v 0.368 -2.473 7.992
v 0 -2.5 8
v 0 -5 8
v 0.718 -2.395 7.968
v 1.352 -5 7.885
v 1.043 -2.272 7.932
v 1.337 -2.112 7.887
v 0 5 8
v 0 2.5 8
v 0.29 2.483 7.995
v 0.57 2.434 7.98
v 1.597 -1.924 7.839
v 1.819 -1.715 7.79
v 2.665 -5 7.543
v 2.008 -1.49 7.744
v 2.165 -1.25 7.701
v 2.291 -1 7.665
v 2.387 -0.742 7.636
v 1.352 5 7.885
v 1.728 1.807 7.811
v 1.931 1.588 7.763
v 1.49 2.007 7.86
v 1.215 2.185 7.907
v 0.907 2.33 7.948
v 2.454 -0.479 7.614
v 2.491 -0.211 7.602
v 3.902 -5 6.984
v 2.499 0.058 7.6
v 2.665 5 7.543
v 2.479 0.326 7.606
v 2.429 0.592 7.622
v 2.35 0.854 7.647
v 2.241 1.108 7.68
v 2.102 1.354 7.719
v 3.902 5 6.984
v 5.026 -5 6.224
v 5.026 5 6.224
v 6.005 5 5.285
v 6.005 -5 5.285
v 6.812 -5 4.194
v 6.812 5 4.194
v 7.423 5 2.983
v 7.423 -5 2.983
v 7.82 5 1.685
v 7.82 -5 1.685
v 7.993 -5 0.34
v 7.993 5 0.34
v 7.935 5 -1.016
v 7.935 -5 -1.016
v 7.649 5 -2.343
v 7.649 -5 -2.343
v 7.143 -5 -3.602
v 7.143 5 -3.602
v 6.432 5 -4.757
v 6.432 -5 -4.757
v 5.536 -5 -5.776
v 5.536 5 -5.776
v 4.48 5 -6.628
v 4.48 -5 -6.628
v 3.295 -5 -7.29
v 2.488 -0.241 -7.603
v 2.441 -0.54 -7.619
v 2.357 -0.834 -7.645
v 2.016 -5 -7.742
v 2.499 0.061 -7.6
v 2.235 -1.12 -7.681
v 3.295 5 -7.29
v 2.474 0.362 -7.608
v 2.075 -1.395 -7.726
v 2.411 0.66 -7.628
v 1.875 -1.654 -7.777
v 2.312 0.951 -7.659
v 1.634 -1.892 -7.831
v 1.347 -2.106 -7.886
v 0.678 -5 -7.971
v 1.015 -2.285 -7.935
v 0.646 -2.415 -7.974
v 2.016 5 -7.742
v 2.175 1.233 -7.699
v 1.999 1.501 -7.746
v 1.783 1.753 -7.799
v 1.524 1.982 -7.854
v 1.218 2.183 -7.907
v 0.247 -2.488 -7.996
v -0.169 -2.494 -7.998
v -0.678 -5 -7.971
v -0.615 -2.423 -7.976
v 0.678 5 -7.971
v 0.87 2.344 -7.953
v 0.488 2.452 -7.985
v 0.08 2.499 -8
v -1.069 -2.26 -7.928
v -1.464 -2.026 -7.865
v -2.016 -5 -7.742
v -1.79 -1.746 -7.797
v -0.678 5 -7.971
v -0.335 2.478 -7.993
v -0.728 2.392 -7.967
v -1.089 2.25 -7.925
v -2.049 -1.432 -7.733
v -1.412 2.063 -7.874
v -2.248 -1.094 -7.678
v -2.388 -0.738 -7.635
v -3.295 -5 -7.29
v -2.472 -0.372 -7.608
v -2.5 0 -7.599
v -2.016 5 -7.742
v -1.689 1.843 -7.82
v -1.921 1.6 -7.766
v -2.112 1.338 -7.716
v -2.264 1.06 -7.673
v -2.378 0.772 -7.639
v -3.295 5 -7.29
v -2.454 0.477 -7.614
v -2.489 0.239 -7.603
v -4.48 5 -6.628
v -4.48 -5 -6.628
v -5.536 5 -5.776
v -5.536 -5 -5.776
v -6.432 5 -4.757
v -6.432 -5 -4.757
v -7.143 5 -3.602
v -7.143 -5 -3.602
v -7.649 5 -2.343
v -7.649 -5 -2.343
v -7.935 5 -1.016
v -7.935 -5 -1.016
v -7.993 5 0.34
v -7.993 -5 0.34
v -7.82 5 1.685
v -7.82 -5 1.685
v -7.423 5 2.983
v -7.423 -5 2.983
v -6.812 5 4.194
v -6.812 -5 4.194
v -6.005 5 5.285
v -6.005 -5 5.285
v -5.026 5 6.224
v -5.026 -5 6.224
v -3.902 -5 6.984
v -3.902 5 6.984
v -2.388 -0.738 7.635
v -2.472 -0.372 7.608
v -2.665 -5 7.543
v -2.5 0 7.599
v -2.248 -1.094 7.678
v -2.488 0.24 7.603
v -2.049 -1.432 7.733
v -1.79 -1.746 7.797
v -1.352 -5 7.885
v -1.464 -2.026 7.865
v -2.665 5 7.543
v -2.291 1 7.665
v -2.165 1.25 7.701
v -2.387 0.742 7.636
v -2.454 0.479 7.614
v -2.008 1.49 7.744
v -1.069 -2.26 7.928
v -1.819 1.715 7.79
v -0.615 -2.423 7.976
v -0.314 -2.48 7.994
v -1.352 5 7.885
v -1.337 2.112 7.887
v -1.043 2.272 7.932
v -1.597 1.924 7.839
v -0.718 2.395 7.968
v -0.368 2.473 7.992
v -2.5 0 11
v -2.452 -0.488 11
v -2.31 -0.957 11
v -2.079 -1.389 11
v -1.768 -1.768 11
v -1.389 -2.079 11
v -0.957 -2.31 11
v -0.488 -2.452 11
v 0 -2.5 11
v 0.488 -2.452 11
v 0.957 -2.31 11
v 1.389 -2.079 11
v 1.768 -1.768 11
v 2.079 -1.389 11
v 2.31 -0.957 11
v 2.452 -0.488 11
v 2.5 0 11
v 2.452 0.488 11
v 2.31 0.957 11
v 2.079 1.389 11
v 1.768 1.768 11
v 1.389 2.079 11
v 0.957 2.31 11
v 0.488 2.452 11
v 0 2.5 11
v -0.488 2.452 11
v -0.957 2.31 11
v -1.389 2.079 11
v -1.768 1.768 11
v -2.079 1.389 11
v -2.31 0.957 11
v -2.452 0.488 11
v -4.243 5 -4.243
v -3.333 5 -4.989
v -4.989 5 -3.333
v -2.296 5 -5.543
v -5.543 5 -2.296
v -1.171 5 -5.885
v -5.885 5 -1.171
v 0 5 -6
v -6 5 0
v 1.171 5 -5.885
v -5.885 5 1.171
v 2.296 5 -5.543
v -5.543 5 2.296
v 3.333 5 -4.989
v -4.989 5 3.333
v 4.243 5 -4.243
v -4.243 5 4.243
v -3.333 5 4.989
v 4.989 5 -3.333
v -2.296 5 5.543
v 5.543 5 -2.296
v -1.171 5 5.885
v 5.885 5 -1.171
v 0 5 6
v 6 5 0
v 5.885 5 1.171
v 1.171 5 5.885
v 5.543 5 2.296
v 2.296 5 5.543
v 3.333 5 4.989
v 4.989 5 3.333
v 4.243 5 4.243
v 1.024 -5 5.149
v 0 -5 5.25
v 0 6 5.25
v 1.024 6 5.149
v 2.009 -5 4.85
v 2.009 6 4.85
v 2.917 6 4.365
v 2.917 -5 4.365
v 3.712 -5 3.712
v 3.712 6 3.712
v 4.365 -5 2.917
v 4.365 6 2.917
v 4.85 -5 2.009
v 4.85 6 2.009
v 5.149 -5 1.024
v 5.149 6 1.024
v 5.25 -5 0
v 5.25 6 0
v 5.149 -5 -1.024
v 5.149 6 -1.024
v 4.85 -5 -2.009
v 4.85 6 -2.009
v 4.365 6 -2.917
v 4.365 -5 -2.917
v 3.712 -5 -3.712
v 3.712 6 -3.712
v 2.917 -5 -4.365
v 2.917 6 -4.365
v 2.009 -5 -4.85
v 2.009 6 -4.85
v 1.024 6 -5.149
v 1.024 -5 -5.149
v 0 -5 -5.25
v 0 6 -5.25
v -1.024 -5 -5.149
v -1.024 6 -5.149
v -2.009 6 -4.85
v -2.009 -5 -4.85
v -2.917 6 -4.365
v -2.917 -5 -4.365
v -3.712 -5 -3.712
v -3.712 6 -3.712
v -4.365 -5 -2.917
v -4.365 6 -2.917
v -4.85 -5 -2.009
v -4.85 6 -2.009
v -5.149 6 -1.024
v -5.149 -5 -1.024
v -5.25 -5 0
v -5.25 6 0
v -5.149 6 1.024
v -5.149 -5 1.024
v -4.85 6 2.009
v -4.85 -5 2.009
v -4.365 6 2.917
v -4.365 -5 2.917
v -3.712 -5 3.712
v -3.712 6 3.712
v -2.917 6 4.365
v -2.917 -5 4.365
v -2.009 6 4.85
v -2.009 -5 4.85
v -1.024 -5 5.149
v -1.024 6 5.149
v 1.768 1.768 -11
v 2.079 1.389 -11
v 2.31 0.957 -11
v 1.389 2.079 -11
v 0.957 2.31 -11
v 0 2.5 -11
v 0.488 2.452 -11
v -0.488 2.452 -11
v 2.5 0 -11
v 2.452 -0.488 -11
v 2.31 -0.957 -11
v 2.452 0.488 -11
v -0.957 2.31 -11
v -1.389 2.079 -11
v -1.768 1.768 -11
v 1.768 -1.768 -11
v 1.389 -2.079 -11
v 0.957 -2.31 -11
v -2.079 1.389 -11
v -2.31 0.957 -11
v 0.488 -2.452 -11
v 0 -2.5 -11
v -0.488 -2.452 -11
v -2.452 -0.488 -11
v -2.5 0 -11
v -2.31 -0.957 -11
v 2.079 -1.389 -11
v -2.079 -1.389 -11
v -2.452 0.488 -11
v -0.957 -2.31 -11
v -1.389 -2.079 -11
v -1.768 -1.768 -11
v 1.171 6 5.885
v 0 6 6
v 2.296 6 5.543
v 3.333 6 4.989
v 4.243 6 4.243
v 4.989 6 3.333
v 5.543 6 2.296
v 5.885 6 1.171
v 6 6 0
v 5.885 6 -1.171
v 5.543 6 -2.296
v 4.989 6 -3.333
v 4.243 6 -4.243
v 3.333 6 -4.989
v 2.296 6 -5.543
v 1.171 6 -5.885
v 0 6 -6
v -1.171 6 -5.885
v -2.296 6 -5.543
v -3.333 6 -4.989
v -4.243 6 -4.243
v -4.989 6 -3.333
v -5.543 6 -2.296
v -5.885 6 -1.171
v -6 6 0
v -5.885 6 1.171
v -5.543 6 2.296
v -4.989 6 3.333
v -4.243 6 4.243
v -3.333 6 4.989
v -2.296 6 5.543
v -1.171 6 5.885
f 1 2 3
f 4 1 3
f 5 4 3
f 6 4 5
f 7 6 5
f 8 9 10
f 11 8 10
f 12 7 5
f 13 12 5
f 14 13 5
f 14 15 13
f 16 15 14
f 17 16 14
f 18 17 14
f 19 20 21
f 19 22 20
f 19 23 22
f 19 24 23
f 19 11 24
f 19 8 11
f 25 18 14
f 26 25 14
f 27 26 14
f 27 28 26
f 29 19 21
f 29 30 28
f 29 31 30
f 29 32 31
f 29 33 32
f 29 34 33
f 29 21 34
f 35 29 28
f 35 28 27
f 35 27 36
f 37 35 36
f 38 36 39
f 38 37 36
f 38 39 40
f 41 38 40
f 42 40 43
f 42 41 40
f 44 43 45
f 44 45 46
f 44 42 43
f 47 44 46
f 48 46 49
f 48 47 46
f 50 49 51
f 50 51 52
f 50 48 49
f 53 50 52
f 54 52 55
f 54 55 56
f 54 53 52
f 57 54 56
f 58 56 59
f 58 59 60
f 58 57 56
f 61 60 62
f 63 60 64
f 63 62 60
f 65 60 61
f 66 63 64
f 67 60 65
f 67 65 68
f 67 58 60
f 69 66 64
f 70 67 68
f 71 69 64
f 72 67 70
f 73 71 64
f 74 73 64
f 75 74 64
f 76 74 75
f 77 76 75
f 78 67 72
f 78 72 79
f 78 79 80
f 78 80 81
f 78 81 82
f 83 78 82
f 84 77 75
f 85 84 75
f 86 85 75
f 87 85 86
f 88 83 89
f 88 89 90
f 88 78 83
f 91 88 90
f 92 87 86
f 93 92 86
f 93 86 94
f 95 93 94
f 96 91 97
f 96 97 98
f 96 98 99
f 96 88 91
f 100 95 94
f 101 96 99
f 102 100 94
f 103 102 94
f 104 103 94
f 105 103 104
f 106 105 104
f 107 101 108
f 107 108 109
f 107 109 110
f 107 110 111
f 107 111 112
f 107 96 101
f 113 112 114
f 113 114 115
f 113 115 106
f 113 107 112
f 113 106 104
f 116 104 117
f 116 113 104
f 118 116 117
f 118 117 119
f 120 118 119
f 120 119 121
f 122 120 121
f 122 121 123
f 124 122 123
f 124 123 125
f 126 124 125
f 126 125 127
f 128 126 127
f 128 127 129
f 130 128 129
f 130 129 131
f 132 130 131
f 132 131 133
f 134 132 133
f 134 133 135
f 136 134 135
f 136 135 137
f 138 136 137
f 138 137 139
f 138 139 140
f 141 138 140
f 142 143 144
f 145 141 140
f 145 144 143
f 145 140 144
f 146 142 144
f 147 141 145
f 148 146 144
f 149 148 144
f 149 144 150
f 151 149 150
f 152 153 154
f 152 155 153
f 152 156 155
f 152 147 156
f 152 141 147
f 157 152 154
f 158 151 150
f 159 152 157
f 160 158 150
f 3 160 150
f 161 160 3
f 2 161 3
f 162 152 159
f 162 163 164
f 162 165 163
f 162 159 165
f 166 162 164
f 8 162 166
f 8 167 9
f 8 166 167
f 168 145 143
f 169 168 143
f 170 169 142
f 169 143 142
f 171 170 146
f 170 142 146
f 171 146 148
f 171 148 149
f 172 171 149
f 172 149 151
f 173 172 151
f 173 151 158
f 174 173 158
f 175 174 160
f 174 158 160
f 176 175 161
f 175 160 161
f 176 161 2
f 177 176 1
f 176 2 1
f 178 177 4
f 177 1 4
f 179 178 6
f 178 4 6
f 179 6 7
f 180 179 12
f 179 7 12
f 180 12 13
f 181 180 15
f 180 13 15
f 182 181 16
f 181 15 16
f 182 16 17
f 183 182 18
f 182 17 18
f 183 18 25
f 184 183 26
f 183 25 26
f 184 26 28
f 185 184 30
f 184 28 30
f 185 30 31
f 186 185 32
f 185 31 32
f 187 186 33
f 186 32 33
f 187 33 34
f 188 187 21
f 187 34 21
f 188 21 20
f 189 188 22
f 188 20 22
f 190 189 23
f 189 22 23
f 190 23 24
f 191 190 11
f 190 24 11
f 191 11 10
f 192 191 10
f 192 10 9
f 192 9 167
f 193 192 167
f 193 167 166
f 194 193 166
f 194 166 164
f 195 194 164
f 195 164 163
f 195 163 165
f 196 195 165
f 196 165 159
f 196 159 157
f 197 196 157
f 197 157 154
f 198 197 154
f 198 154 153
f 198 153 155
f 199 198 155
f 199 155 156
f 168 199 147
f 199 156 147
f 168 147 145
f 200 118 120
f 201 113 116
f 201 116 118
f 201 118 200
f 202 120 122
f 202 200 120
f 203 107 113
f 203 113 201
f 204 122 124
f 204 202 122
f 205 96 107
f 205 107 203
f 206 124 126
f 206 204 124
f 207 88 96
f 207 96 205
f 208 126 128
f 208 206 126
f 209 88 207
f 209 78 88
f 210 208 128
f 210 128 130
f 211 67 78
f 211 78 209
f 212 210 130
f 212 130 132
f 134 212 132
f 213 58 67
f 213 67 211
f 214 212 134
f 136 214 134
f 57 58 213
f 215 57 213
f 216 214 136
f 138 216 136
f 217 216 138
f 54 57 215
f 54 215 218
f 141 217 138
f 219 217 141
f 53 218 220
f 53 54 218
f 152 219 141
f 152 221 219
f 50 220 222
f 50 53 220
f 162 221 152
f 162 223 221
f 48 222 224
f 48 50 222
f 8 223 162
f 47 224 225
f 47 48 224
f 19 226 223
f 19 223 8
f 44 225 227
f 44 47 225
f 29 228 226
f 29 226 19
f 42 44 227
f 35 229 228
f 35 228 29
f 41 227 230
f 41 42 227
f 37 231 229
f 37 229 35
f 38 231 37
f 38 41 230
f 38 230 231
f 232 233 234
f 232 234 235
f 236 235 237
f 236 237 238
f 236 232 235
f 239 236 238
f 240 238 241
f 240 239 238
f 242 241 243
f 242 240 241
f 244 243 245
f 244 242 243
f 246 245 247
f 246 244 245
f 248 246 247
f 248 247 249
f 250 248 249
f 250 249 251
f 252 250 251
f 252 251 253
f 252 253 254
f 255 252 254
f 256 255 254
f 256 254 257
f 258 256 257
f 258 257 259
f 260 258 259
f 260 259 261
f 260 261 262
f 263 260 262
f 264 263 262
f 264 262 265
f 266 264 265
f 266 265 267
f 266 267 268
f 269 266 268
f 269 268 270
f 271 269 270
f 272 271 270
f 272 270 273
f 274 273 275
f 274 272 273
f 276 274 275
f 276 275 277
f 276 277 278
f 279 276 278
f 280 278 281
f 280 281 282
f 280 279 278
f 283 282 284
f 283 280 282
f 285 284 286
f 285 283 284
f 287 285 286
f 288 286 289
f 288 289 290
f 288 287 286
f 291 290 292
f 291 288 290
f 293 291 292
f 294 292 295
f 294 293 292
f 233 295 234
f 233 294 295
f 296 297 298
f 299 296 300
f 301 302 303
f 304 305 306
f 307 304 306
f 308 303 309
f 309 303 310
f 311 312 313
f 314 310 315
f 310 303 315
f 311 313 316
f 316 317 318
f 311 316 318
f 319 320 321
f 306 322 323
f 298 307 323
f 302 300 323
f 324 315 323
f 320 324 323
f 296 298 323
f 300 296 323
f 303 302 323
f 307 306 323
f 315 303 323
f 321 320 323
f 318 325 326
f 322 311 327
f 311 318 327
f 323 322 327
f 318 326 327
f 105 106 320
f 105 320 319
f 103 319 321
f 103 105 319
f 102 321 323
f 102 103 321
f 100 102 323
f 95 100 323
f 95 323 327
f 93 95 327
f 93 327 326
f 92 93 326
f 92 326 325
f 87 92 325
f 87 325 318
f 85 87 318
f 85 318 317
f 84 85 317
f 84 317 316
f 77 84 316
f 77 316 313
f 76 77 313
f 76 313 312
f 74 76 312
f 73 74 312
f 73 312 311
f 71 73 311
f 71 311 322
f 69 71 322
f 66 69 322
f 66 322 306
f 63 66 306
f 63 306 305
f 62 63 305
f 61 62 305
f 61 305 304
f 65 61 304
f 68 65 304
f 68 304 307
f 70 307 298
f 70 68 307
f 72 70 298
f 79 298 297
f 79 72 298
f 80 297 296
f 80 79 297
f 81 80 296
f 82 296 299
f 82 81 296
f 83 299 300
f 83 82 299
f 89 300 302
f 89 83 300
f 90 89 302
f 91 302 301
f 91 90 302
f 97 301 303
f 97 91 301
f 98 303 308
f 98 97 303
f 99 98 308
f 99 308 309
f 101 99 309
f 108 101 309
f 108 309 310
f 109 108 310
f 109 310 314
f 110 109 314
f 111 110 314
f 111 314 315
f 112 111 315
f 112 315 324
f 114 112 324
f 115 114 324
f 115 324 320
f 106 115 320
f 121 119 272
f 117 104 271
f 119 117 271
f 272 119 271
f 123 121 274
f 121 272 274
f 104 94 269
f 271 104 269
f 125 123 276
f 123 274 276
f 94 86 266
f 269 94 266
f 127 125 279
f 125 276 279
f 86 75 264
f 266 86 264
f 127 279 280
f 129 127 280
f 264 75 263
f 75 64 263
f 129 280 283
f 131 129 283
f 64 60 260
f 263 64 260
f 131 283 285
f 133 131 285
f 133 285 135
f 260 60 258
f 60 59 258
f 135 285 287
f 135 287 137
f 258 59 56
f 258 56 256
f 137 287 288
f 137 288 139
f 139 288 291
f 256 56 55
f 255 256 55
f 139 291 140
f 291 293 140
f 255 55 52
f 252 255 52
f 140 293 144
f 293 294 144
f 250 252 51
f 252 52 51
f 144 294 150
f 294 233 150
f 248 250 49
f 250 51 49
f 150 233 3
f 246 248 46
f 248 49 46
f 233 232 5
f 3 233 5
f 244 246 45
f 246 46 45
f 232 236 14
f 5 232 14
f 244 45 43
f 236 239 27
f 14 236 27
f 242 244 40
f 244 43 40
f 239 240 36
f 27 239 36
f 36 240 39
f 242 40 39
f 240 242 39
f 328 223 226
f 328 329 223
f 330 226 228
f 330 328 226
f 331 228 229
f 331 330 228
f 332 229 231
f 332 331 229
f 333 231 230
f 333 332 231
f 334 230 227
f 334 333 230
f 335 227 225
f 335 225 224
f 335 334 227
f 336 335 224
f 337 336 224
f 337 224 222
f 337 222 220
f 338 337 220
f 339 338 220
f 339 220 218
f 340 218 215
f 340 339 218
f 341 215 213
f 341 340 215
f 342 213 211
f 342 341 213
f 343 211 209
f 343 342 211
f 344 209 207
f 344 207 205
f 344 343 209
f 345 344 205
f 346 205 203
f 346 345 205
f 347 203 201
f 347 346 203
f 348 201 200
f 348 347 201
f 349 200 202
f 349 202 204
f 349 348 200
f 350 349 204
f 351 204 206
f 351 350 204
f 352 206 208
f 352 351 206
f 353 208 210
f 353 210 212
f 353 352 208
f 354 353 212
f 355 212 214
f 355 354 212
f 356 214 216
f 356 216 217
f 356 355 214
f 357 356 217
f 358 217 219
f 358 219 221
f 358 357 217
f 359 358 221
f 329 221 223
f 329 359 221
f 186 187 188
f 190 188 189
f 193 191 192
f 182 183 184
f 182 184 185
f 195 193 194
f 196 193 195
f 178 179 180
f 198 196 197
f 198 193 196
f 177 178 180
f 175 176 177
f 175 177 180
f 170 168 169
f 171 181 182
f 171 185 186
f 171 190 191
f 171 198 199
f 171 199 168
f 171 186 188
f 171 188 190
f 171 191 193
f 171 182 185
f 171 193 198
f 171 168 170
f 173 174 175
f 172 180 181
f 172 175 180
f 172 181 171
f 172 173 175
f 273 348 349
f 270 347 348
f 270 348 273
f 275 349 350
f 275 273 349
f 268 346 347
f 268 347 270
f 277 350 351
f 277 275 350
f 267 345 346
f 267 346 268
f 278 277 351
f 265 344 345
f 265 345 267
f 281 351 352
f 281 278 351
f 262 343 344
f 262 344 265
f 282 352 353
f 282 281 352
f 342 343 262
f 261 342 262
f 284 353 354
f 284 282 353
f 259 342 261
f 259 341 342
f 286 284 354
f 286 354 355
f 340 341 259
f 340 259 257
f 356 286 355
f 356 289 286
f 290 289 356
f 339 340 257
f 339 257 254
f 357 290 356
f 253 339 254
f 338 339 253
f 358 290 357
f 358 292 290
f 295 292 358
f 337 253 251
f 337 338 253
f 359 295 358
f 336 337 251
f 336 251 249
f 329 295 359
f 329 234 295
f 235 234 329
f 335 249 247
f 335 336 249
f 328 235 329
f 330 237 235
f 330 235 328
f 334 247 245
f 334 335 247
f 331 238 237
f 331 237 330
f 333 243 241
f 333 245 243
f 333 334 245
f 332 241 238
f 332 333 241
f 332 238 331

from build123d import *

# Parameters (mm, degrees)
SKETCH1_R           = 8
SKETCH1_R_2         = 5.25
BOSS_EXTRUDE1_DEPTH = 5
SKETCH2_R           = 6
SKETCH2_R_2         = 5.25
BOSS_EXTRUDE2_DEPTH = 1
SKETCH3_R           = 2.5
BOSS_EXTRUDE3_DEPTH = 5


with BuildPart() as part:
    # Sketch1 → Boss-Extrude1 (new, symmetric)
    with BuildSketch(Plane(origin=(0, 0, 0), x_dir=(1, 0, 0), z_dir=(0, 1, 0))):
        with Locations(Location((0, 0, 0), (0, 0, 270))):
            Circle(SKETCH1_R)
        with Locations(Location((0, 0, 0), (0, 0, 270))):
            Circle(SKETCH1_R_2, mode=Mode.SUBTRACT)
    extrude(amount=BOSS_EXTRUDE1_DEPTH, both=True)

    # Sketch2 → Boss-Extrude2 (add, symmetric)
    with BuildSketch(Plane(origin=(0, 5, 0), x_dir=(1, 0, 0), z_dir=(0, 1, 0))):
        with Locations(Location((0, 0, 0), (0, 0, 270))):
            Circle(SKETCH2_R)
        with Locations(Location((0, 0, 0), (0, 0, 270))):
            Circle(SKETCH2_R_2, mode=Mode.SUBTRACT)
    extrude(amount=BOSS_EXTRUDE2_DEPTH, both=True)

    # Sketch3 → Boss-Extrude3 (add)
    with BuildSketch(Plane.XY.offset(6)):
        with Locations(Location((0, 0, 0), (0, 0, 180))):
            Circle(SKETCH3_R)
    boss_extrude3 = extrude(amount=BOSS_EXTRUDE3_DEPTH)

    # Mirror1: Boss-Extrude3 across plane
    add(boss_extrude3.mirror(Plane.XY))


solid = part.part
